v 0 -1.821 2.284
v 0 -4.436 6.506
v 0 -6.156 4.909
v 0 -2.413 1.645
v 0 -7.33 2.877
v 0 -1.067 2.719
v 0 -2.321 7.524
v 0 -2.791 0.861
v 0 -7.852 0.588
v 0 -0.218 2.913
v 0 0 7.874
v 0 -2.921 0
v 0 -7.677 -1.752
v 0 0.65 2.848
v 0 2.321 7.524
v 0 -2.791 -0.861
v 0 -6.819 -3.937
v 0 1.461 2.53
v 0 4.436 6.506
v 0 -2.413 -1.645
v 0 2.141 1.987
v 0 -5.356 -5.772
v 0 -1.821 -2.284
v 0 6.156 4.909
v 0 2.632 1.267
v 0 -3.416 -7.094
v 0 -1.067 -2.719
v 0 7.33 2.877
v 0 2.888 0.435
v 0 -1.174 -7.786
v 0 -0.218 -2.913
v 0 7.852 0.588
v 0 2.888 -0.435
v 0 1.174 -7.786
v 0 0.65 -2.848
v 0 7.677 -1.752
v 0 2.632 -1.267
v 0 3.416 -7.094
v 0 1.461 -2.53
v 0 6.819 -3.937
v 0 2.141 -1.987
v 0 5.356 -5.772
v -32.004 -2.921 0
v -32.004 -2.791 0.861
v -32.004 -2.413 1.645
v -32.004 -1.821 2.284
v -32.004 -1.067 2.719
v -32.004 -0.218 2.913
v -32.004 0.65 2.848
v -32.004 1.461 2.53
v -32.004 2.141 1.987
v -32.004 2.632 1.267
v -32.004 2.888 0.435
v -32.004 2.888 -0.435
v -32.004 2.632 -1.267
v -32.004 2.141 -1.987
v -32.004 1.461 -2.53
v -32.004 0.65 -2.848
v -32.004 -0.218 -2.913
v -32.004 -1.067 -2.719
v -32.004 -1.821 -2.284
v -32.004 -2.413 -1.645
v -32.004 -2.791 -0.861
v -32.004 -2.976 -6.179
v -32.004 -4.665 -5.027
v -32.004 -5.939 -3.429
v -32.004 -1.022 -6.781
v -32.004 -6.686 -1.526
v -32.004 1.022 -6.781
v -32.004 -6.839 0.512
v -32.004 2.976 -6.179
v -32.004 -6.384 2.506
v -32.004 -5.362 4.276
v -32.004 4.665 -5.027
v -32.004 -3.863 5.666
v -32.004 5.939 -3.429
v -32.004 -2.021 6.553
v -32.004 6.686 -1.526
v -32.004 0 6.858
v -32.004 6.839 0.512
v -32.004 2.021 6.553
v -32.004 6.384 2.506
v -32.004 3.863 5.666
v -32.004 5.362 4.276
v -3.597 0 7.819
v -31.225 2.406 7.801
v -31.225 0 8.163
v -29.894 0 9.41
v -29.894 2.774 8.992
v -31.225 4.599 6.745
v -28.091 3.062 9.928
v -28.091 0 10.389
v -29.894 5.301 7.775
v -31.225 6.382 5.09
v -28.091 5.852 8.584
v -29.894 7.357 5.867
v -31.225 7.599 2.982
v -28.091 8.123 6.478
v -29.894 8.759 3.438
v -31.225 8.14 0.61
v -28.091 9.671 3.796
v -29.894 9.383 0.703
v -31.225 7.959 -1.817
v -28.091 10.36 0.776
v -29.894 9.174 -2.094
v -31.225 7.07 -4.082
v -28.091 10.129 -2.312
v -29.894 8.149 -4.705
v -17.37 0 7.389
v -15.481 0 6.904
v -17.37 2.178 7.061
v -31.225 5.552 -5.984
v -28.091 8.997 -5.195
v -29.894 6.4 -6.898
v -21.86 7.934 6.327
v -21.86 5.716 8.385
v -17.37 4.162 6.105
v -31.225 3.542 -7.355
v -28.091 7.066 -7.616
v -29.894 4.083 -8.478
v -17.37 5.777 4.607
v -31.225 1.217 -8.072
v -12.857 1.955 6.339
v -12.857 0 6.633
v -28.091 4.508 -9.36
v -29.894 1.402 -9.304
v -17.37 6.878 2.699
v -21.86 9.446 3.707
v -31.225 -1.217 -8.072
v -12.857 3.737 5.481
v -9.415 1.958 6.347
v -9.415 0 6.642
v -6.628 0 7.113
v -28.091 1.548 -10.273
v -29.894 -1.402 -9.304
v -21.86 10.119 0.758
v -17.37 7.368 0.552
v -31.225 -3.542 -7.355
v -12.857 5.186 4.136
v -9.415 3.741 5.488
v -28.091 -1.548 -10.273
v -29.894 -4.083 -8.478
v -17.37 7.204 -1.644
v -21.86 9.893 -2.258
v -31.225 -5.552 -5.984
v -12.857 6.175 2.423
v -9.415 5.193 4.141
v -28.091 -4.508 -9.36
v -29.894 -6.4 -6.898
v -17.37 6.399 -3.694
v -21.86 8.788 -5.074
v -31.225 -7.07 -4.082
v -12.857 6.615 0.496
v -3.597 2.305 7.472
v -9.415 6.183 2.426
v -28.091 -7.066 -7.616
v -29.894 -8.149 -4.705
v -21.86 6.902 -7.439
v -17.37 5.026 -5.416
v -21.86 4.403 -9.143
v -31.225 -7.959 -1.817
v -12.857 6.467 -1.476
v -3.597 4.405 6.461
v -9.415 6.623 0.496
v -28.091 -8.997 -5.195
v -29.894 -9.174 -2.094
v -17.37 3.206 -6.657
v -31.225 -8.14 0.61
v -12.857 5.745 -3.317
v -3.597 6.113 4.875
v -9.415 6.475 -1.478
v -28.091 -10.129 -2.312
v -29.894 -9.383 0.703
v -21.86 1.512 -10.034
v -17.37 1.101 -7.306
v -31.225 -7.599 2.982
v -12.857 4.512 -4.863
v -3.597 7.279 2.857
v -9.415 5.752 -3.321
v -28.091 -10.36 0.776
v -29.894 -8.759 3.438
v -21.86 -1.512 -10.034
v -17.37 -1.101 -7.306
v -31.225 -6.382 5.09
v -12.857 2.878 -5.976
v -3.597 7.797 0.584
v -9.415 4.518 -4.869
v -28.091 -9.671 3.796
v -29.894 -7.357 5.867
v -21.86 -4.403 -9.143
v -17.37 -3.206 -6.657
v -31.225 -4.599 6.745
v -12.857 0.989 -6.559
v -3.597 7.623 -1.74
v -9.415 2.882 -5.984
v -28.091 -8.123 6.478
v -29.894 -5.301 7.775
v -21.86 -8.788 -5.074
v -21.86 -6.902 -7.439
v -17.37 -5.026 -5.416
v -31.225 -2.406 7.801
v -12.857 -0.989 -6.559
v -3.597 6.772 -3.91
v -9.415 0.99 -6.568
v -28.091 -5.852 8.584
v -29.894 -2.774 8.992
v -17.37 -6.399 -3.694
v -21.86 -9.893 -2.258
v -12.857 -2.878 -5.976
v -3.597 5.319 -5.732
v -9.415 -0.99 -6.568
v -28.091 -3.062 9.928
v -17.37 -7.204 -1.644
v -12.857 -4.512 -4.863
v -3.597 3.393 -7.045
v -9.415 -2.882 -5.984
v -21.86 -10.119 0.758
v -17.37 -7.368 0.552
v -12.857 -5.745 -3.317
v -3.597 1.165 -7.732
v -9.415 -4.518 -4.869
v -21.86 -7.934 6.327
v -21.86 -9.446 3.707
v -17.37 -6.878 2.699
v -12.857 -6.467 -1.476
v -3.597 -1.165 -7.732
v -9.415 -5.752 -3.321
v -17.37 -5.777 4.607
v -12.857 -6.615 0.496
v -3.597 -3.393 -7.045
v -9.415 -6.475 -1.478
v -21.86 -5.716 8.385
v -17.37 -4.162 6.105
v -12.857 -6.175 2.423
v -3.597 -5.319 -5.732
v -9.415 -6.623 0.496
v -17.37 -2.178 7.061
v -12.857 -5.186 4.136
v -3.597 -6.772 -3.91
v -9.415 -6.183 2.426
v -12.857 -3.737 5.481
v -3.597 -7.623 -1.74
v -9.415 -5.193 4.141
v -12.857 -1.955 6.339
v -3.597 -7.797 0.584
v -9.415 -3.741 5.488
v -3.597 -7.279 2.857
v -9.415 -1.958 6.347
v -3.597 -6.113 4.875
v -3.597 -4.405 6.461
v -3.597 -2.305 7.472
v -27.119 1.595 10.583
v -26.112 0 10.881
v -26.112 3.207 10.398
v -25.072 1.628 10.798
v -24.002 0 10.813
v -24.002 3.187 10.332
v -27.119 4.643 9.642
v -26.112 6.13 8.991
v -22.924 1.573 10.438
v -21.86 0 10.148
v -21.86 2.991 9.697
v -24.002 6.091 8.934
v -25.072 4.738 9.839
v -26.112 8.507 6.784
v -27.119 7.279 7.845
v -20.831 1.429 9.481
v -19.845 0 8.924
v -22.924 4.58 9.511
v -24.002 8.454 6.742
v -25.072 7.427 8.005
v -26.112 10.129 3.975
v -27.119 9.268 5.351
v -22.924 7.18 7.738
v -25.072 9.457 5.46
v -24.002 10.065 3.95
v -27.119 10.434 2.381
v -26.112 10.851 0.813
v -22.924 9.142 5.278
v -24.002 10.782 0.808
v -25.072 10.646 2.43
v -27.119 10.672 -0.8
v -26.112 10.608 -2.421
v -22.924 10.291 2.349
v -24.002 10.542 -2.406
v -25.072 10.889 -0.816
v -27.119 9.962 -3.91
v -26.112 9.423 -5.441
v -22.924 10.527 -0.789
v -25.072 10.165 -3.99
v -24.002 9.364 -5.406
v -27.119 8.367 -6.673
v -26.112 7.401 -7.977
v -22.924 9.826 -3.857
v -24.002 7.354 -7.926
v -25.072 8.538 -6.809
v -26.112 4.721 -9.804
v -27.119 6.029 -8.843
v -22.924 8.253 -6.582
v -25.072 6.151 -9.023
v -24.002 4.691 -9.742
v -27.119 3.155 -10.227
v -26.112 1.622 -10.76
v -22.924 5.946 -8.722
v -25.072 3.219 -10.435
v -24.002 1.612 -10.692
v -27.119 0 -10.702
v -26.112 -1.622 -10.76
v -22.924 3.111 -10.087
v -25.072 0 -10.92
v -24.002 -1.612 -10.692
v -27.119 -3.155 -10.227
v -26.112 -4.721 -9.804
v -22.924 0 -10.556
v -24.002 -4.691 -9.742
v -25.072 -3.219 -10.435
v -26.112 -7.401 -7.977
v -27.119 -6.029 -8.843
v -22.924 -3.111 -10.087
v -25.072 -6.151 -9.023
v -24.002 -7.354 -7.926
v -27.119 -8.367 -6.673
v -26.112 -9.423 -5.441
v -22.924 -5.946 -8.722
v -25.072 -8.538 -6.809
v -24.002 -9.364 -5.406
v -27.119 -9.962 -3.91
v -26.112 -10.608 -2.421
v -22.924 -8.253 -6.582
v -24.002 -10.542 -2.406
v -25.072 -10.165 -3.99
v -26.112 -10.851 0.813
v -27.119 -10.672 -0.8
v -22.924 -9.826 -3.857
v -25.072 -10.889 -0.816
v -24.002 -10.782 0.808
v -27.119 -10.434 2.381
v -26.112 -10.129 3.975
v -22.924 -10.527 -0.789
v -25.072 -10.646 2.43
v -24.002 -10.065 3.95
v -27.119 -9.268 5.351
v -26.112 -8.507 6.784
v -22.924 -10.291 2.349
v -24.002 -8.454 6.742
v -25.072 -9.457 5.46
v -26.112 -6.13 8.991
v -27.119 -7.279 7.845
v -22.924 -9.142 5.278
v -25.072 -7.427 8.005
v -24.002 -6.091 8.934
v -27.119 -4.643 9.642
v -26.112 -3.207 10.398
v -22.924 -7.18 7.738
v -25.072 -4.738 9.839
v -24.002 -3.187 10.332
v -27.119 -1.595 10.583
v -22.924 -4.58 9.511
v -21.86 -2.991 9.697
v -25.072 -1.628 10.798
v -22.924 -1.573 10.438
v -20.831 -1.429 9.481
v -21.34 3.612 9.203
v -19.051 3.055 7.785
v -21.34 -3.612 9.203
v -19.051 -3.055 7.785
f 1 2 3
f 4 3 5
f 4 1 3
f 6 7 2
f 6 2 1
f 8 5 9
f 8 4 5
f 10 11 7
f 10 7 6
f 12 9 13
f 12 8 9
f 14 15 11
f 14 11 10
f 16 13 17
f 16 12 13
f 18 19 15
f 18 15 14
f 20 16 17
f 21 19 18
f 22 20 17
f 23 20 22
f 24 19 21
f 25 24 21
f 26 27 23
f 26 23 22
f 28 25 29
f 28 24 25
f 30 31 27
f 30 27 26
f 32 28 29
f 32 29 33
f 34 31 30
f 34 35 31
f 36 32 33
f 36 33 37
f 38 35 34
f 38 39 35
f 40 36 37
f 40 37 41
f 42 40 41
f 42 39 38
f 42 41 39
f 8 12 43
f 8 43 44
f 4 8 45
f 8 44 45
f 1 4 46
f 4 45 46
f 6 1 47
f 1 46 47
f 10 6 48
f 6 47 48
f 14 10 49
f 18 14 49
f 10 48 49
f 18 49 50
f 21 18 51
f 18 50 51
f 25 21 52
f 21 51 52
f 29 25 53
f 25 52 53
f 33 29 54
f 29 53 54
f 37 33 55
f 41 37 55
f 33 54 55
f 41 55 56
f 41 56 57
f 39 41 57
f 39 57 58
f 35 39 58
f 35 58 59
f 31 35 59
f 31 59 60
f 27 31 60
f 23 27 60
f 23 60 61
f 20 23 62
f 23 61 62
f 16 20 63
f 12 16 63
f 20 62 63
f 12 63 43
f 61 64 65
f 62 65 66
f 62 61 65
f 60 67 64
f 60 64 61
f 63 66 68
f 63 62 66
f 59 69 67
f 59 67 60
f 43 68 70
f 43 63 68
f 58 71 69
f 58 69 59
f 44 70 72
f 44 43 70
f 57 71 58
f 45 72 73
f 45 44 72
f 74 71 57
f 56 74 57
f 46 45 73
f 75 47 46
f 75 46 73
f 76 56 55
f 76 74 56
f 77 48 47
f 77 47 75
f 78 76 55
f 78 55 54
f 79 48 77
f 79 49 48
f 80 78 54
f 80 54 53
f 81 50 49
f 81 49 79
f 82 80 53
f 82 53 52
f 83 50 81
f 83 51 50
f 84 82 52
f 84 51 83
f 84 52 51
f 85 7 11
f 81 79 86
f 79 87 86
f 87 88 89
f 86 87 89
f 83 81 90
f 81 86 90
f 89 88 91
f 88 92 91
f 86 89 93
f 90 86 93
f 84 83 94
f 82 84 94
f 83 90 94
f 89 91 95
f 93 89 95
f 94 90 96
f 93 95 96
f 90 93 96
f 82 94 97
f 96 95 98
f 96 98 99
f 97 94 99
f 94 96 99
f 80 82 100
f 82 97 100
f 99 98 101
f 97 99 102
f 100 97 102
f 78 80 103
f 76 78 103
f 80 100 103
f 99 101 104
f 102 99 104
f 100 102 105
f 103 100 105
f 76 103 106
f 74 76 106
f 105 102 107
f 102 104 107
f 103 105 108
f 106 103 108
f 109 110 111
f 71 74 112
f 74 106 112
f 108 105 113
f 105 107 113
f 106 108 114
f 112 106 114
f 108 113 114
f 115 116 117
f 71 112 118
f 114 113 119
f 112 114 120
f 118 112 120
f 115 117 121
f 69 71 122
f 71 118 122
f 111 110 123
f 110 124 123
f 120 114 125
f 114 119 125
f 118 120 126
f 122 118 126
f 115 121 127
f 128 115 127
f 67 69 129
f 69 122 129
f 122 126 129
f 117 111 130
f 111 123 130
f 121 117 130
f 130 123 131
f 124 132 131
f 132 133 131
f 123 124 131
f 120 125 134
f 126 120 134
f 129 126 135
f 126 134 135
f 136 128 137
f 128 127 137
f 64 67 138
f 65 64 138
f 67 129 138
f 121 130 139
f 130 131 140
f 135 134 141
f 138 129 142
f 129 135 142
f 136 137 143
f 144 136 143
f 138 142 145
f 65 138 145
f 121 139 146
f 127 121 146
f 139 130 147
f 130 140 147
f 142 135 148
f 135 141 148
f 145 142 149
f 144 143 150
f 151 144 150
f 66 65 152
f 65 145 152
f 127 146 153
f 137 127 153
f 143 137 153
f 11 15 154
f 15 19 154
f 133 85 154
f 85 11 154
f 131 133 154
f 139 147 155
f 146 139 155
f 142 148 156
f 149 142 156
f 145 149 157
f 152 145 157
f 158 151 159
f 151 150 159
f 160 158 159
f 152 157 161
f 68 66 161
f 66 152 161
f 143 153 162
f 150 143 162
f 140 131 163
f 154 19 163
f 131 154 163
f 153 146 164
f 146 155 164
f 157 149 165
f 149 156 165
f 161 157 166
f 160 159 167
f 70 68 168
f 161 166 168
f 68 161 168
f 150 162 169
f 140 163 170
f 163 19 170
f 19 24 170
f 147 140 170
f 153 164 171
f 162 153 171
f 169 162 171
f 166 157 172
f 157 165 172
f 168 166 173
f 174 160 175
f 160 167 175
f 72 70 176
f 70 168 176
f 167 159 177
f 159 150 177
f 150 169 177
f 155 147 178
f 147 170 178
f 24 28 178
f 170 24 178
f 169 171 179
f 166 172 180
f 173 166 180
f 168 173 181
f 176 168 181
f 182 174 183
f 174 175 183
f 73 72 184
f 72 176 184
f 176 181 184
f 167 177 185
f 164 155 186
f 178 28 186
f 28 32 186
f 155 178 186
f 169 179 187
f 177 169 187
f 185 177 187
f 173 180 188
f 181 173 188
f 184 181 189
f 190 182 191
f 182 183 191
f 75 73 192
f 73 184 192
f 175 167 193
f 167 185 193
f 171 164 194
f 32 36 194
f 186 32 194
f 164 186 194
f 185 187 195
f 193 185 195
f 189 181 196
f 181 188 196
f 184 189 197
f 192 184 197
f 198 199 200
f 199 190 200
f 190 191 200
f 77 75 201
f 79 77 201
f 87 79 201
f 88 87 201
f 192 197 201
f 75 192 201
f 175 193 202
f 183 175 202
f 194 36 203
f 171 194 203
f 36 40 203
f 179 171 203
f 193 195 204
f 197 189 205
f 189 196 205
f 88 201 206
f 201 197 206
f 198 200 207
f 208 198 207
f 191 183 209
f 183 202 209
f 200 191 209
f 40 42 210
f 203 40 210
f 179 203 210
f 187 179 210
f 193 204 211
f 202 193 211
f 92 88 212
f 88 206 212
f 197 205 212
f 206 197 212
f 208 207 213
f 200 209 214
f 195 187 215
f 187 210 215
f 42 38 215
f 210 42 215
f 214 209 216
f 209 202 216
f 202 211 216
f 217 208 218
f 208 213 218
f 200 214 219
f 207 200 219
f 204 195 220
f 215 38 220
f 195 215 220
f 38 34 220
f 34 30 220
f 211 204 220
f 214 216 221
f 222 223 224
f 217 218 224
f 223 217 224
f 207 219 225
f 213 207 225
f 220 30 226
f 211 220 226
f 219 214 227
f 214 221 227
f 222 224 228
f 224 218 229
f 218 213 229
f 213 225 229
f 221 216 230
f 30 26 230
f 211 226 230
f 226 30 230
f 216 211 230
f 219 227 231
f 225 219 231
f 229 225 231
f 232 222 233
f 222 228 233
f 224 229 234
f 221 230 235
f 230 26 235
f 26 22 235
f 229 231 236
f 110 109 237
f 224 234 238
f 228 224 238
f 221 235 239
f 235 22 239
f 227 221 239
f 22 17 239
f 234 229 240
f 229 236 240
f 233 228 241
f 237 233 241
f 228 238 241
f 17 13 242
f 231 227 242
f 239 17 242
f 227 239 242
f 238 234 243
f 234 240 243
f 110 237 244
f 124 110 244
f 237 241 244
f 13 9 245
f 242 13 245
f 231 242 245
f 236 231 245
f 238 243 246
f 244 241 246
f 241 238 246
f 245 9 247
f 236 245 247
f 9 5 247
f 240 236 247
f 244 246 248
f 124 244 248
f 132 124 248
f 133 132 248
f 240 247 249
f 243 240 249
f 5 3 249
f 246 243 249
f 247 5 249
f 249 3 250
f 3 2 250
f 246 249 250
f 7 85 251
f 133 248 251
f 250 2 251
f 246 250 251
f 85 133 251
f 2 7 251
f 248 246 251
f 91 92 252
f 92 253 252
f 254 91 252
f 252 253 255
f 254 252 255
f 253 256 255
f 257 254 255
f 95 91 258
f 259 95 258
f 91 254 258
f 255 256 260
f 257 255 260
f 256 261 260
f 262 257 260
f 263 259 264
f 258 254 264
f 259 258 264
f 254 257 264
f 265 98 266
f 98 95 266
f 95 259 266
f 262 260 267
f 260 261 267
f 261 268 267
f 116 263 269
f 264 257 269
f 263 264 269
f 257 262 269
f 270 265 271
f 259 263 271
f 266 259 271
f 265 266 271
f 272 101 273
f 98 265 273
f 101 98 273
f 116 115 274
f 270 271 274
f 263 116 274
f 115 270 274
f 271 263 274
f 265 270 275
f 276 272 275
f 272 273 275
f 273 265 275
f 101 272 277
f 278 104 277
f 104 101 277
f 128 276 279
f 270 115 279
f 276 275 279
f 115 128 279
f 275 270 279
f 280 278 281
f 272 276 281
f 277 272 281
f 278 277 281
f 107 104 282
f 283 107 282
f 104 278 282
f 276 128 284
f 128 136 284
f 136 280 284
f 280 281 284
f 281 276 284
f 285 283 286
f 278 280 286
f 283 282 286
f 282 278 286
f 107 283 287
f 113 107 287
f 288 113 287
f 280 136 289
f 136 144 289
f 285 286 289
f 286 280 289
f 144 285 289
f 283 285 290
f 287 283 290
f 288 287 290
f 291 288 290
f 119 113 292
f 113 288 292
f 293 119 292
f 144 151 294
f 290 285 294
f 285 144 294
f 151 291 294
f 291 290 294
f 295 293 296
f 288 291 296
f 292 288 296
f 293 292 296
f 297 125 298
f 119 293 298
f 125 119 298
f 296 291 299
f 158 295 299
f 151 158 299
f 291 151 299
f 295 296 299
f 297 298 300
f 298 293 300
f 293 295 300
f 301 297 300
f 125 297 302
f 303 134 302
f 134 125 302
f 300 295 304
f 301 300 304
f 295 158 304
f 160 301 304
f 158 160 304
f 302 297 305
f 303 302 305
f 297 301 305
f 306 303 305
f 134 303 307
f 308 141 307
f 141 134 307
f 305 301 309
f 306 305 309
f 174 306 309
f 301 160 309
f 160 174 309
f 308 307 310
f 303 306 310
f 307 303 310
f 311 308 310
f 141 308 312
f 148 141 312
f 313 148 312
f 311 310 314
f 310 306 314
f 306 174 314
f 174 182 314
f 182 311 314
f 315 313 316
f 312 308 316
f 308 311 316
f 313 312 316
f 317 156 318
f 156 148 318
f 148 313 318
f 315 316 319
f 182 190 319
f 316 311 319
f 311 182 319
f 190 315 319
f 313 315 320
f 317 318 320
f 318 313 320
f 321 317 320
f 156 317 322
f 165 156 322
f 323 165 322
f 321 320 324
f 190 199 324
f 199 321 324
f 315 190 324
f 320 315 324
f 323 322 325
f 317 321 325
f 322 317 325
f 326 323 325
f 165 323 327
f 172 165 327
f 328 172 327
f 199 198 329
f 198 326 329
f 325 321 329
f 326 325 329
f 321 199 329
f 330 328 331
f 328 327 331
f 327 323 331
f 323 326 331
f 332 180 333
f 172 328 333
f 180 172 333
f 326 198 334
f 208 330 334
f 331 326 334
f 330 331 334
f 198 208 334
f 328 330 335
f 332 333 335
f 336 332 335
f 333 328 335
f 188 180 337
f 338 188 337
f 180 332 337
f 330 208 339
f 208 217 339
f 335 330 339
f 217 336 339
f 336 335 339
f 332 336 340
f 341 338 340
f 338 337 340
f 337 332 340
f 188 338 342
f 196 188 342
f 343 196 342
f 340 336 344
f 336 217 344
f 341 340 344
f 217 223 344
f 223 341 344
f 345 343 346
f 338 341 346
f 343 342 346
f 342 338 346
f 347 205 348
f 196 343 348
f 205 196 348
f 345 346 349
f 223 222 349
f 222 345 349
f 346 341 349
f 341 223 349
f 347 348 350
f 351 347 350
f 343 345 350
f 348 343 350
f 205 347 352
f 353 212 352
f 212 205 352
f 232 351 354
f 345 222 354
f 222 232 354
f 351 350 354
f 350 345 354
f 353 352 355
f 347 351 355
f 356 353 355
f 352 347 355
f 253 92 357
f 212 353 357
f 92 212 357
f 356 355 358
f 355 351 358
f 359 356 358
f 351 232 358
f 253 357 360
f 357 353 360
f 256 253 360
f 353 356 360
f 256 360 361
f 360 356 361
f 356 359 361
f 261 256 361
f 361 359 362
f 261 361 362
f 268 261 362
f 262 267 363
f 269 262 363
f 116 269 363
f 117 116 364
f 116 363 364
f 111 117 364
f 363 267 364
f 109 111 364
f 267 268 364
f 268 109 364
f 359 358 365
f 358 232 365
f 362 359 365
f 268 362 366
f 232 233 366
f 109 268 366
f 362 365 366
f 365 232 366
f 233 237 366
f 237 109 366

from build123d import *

# Parameters (mm, degrees)
F2_R     = 2.921
F3_DEPTH = 63.5


with BuildPart() as f1:
    # F0 (on Front) → F1 (revolve)
    with BuildSketch(Plane.XZ):
        with BuildLine():
            Line((-32.004, 0), (0, 0))
            Line((0, 0), (0, 7.874))
            add(Edge.make_bspline(
                [(-32.004, 6.858), (-31.7240577075, 7.4027067279), (-31.0895240395, 8.63737104), (-28.446969556, 10.4812689156), (-25.1152171415, 11.2050774937), (-21.2052489904, 10.2091955056), (-17.9964726984, 7.3246509106), (-15.1332256977, 6.8183052658), (-12.1948122719, 6.531644147), (-7.5664337534, 6.6150860016), (-4.4393696165, 7.9764992794), (-1.5400890797, 7.9095586569), (0, 7.874)],
                knots=[0, 0, 0, 0, 0.0751698542, 0.1703844135, 0.2695127958, 0.3768712538, 0.488108033, 0.577969998, 0.6714956753, 0.7866703571, 0.8866799369, 1, 1, 1, 1], degree=3))
            Line((-32.004, 6.858), (-32.004, 0))
        make_face()
    revolve(axis=Axis((-16.002, 0, 0), (-1, 0, 0)))


with BuildPart() as f3:
    # F2 (on face) → F3 (new body, symmetric)
    with BuildSketch(Plane(origin=(-32.004, 0, 0), x_dir=(0, -1, 0), z_dir=(-1, 0, 0))):
        Circle(F2_R)
    extrude(amount=F3_DEPTH, both=True)


with BuildPart() as f1_1:
    add(f1.part)

    # F4: cut F3
    add(f3.part, mode=Mode.SUBTRACT)


solid = f1_1.part
